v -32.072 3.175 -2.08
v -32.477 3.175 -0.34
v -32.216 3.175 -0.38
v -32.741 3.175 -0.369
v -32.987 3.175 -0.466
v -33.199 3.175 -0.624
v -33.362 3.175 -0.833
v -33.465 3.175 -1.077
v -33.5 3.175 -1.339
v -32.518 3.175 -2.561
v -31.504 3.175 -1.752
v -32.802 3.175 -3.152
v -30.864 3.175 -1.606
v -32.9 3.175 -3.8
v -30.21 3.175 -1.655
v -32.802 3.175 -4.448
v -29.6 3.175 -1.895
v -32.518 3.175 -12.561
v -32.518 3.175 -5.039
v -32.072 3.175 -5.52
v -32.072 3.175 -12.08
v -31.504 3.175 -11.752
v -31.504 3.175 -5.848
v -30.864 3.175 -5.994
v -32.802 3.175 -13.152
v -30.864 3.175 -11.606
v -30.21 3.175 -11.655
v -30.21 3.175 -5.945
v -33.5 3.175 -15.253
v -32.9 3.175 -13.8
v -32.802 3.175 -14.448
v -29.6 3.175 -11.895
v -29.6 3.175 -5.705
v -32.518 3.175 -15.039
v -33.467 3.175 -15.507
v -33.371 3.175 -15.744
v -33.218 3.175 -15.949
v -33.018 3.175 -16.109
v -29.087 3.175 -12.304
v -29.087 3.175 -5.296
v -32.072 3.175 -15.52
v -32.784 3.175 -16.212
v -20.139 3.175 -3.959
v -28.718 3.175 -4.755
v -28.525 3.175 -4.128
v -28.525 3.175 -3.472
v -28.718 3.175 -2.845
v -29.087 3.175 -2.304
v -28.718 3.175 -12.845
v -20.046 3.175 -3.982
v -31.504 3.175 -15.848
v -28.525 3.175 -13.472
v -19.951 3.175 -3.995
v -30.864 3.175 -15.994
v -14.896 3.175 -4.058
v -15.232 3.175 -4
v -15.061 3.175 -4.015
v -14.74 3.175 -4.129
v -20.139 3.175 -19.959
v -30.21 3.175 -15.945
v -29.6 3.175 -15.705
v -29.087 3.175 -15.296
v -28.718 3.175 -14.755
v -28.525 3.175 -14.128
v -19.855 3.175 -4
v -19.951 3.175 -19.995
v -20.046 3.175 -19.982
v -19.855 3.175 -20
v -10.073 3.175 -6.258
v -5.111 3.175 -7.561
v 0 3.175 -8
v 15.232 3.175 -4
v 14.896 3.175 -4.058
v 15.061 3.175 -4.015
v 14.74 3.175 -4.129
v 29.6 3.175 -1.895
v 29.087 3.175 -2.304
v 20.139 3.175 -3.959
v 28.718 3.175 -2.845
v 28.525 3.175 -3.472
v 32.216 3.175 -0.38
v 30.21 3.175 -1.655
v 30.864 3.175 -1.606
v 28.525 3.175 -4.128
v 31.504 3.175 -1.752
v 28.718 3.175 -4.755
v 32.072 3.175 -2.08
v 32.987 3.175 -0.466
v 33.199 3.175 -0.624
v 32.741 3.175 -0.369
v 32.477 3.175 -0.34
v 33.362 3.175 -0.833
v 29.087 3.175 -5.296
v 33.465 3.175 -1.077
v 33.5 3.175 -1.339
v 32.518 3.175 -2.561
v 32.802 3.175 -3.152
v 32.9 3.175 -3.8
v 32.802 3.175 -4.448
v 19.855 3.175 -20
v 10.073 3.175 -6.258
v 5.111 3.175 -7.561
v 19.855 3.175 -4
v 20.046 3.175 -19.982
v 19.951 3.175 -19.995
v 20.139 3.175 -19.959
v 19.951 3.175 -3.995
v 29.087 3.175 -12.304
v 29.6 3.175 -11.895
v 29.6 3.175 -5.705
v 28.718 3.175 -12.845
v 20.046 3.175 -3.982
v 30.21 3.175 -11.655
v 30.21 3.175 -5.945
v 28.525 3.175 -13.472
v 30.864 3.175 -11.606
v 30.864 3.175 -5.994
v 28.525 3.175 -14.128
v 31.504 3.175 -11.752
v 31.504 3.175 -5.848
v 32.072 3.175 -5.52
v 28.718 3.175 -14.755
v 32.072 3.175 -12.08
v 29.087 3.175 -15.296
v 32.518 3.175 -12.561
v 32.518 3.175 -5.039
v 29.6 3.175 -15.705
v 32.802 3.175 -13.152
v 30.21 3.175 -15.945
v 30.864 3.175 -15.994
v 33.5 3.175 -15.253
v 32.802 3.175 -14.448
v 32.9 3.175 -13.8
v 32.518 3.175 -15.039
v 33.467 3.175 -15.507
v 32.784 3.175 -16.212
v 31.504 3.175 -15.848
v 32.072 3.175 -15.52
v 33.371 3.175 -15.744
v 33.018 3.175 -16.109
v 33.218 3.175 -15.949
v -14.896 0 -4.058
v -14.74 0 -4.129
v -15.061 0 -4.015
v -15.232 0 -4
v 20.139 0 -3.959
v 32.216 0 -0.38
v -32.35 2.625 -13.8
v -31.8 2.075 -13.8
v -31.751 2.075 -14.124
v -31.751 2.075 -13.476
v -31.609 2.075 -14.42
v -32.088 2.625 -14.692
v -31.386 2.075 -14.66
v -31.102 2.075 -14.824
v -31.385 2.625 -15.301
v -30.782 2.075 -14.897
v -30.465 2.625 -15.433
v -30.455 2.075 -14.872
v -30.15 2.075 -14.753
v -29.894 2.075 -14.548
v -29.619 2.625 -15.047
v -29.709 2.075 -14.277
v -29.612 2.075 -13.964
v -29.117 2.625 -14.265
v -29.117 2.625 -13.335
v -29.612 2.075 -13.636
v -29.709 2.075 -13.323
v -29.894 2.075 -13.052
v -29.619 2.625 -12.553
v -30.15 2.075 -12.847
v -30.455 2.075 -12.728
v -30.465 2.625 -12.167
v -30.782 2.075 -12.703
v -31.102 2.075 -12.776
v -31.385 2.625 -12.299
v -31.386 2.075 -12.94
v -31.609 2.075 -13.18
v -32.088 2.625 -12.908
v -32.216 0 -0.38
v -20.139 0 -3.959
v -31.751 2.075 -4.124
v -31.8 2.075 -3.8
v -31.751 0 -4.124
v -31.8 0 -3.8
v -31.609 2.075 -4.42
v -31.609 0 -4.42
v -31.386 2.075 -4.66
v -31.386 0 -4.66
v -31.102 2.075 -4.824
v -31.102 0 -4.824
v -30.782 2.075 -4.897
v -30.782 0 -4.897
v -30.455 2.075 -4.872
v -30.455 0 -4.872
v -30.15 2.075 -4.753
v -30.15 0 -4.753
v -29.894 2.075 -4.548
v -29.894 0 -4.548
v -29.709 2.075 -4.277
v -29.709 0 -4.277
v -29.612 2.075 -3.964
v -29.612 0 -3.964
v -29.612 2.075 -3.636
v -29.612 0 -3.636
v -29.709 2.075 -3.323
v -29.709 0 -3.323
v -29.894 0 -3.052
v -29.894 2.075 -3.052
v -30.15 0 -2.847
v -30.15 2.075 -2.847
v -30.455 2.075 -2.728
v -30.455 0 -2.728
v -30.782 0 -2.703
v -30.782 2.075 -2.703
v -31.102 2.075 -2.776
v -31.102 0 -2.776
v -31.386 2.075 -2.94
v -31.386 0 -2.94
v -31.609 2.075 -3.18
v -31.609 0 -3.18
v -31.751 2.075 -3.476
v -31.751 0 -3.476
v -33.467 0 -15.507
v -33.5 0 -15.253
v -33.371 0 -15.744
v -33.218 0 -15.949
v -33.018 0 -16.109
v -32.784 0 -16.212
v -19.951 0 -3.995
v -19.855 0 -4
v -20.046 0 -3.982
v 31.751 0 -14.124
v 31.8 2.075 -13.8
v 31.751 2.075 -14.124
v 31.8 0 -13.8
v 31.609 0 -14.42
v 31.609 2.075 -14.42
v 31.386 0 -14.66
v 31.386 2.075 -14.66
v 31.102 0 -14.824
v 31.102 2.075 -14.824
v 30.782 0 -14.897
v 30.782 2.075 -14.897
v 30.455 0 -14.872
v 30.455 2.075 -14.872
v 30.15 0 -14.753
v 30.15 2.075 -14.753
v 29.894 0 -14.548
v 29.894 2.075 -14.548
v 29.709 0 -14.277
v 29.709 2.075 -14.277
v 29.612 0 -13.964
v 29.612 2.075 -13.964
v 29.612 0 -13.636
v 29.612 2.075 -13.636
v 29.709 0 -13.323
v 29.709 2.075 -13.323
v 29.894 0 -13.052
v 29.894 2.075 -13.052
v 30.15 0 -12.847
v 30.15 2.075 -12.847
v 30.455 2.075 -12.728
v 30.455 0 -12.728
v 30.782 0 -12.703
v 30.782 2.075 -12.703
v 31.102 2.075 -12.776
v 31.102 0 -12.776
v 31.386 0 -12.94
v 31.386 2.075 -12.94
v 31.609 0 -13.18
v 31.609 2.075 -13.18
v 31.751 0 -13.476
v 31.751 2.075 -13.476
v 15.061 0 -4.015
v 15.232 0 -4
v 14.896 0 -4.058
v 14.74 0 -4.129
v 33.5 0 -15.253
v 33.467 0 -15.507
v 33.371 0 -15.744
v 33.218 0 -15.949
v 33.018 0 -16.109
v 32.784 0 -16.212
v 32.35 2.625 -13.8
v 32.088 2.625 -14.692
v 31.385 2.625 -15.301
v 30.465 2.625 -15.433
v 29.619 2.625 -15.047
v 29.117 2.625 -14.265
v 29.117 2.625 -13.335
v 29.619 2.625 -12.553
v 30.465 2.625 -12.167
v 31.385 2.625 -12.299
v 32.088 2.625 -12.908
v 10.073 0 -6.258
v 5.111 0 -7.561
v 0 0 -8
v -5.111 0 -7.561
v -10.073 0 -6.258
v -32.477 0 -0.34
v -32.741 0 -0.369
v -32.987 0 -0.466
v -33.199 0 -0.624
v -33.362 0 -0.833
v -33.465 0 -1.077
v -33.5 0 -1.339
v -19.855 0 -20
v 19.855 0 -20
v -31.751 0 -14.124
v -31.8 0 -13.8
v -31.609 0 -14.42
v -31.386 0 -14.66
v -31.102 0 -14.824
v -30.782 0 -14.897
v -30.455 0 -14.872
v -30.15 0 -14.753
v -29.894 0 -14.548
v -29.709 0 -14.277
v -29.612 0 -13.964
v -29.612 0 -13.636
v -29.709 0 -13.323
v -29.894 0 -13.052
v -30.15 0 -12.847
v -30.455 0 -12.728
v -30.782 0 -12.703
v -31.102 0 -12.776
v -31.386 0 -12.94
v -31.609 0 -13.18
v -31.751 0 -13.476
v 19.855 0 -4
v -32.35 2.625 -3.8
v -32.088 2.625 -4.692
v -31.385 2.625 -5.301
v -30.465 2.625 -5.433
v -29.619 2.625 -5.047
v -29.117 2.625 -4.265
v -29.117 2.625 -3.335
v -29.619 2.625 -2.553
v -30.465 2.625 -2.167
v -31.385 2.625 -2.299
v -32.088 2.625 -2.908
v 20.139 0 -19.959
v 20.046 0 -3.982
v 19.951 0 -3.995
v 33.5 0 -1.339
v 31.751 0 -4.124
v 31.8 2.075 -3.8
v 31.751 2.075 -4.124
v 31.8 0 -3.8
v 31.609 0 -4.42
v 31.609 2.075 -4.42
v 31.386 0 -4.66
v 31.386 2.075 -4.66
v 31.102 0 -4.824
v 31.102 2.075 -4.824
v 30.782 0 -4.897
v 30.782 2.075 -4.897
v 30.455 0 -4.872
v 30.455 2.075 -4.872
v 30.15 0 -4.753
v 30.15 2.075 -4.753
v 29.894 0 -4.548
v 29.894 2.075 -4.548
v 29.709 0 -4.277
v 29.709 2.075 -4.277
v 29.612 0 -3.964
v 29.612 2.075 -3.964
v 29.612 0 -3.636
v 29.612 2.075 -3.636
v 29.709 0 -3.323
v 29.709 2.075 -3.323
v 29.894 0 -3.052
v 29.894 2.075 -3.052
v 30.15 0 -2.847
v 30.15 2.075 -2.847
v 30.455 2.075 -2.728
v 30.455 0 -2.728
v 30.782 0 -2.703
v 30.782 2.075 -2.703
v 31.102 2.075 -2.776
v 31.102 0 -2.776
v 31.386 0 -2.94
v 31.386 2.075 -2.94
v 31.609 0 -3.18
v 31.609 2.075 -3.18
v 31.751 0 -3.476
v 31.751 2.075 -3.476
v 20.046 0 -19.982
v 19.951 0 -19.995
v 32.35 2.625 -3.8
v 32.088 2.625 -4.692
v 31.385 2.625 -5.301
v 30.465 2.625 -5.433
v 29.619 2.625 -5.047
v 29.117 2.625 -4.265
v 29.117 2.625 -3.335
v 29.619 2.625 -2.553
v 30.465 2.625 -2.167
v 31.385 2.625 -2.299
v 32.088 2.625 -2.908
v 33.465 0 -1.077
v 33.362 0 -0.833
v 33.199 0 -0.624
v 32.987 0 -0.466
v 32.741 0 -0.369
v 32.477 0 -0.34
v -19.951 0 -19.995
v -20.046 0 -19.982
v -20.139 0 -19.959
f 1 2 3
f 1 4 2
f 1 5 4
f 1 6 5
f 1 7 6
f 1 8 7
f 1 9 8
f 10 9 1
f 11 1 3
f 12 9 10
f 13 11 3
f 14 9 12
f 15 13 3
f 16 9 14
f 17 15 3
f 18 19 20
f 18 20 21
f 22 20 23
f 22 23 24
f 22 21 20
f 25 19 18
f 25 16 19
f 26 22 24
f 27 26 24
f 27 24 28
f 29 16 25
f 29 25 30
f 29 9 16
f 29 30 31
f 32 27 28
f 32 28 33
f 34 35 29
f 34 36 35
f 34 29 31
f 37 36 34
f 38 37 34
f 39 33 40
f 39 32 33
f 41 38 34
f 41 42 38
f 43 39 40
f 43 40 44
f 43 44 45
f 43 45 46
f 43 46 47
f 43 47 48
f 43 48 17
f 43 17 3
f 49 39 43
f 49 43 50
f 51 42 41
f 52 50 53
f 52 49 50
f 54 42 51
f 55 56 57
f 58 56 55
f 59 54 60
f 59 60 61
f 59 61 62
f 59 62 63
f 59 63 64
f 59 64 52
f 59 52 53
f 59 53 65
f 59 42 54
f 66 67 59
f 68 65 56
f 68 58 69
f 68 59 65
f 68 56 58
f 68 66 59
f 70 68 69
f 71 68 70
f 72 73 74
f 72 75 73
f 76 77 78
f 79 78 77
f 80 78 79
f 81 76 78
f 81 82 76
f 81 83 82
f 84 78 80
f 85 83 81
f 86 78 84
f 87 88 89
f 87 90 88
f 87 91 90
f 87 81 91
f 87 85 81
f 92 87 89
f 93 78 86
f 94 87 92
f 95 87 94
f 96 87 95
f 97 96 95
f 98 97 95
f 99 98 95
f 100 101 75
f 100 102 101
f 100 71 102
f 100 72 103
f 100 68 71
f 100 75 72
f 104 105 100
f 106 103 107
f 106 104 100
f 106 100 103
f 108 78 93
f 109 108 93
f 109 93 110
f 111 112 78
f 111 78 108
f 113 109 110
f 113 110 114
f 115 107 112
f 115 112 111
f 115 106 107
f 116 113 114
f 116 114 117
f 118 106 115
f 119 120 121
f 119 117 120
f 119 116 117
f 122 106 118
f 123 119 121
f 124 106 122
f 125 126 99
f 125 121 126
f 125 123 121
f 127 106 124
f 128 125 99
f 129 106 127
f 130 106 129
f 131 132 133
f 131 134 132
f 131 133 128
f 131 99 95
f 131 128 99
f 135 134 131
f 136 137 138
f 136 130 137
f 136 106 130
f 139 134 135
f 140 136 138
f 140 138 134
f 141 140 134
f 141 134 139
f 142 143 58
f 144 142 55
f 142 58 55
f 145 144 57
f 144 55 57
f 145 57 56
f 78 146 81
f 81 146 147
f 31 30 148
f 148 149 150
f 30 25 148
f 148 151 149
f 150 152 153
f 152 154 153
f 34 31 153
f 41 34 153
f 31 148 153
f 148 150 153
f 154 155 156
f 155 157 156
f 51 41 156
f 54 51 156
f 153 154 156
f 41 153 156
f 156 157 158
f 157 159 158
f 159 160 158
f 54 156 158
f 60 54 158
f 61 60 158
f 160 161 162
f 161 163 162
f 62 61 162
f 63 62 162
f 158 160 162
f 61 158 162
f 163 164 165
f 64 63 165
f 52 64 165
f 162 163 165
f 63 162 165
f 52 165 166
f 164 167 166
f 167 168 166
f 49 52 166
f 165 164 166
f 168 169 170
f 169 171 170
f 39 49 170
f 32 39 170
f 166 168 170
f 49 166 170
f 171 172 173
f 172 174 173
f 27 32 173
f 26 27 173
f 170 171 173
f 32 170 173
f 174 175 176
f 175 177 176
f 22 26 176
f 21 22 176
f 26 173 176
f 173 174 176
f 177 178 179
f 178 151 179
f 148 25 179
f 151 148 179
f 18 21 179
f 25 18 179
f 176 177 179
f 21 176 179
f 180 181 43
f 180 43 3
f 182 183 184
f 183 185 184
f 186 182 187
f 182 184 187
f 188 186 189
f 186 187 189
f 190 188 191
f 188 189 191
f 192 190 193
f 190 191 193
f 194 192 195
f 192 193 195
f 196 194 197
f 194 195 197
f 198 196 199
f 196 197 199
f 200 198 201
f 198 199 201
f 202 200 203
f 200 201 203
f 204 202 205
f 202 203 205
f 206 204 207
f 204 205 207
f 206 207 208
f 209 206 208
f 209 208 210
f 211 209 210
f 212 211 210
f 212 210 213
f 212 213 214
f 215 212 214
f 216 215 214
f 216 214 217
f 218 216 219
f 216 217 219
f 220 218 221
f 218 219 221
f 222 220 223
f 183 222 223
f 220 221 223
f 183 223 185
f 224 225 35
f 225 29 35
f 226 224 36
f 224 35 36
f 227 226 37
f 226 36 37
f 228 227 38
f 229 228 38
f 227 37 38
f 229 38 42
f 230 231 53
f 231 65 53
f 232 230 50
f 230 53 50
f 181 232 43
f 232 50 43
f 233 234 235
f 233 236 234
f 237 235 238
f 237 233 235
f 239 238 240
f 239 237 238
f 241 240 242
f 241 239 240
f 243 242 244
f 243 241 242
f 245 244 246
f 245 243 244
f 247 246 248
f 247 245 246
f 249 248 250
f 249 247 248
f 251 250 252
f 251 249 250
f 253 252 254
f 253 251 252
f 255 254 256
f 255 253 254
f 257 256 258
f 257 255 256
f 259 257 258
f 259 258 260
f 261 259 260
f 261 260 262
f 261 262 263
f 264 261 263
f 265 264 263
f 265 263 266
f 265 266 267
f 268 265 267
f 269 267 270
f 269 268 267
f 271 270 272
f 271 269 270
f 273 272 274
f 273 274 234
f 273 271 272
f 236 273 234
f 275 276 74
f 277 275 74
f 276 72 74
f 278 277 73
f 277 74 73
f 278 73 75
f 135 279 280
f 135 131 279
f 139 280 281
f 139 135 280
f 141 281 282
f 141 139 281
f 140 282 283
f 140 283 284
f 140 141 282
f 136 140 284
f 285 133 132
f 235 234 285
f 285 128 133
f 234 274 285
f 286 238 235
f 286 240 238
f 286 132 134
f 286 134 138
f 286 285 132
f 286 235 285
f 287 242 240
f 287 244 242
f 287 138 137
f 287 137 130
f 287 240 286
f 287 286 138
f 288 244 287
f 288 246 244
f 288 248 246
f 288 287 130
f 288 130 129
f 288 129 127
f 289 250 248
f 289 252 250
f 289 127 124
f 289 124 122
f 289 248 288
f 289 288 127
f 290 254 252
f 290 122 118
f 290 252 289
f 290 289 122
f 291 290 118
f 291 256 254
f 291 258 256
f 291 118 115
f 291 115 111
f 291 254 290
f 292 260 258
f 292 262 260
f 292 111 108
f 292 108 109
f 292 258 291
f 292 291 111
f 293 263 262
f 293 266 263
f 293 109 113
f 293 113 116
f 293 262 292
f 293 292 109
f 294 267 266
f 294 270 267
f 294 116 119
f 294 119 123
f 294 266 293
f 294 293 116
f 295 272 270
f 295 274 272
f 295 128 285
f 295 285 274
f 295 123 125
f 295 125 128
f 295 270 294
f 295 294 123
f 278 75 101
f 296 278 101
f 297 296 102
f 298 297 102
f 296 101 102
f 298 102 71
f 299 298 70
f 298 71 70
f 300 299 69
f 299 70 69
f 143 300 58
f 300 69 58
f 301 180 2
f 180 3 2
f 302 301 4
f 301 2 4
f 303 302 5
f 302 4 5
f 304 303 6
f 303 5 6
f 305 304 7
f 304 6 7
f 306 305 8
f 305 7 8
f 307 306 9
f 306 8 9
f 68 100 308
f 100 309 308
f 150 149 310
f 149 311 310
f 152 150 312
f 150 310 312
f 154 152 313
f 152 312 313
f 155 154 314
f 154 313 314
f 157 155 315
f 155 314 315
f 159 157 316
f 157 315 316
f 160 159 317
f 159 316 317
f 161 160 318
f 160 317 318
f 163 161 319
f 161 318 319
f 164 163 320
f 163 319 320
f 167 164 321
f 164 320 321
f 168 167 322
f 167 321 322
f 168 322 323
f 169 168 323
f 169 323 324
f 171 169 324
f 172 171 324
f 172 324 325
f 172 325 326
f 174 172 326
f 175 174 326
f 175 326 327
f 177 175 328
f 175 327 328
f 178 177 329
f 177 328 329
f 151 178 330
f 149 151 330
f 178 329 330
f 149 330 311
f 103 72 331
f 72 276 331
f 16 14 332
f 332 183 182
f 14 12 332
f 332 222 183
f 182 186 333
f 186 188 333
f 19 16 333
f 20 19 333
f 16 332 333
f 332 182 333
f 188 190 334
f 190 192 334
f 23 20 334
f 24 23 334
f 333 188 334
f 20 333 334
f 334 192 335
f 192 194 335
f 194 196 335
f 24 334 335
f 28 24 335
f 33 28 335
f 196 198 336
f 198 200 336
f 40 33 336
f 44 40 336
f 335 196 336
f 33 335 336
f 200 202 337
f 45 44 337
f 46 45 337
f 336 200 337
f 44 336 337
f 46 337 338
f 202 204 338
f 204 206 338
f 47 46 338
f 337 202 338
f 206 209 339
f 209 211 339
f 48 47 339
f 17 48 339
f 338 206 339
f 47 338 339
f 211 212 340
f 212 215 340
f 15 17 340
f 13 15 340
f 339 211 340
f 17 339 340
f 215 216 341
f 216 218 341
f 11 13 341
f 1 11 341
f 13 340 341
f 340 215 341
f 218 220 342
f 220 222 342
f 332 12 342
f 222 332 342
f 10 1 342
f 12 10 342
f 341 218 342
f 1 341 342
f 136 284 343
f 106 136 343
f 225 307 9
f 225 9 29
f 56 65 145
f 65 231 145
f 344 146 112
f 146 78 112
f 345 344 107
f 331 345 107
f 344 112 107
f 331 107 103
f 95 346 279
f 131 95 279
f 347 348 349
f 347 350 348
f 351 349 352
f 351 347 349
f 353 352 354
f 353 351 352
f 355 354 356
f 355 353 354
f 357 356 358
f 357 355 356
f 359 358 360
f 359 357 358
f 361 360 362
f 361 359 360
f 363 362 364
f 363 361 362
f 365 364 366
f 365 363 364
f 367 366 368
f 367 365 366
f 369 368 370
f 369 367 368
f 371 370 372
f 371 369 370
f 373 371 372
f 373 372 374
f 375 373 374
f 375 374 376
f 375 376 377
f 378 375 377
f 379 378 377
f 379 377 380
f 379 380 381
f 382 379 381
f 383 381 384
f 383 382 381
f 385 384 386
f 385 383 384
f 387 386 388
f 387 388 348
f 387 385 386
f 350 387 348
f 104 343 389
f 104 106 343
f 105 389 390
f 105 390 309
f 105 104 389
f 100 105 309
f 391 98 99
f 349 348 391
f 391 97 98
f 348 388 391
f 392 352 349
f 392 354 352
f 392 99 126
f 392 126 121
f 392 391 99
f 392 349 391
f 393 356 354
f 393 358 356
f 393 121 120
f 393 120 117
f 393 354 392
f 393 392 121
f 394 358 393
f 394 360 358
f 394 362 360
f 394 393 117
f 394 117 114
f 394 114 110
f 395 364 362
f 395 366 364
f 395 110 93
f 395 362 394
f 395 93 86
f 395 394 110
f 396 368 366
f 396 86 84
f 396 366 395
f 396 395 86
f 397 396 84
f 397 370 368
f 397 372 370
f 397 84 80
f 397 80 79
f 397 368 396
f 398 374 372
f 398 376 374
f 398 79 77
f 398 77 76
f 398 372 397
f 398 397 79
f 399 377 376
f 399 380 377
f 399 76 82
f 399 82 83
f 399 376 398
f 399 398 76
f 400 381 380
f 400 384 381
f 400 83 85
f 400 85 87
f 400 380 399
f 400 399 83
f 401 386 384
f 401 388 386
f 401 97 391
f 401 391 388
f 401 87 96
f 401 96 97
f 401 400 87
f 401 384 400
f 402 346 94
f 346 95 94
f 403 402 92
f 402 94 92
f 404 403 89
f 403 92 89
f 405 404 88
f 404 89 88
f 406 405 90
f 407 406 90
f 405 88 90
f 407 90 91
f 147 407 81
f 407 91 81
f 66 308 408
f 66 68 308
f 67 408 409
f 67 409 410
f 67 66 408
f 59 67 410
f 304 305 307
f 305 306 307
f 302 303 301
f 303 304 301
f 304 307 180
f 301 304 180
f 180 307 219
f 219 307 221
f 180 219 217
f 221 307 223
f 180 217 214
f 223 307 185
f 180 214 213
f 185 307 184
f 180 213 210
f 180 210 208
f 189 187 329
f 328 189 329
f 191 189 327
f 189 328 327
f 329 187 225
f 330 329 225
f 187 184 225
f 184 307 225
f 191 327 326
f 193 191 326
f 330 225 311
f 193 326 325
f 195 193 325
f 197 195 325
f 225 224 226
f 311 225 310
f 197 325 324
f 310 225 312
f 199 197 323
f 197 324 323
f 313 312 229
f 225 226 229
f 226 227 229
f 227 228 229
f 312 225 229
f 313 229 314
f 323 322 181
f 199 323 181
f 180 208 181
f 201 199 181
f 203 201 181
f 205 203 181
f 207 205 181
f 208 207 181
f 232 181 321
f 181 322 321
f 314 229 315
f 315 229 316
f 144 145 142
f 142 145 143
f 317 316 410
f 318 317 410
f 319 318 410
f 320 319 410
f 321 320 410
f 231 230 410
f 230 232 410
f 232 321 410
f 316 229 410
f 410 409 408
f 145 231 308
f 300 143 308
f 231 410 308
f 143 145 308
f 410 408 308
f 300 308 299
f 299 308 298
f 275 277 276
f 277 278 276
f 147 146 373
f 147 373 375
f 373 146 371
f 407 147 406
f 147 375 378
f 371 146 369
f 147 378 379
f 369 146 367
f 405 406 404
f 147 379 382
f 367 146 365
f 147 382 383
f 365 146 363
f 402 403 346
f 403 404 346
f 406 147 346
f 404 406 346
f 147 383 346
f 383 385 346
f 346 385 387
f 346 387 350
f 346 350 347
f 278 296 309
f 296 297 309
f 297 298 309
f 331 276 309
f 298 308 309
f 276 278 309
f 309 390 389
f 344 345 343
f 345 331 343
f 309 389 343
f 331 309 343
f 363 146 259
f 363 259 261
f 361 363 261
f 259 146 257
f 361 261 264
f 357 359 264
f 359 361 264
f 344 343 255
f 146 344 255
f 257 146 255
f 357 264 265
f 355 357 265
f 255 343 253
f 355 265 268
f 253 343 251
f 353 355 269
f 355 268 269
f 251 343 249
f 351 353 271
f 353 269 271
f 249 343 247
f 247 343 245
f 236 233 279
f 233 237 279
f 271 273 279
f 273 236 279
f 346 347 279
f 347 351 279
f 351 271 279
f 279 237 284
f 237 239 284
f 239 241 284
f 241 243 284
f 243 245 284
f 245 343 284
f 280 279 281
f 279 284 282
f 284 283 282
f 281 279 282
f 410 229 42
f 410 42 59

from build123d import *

# Parameters (mm, degrees)
BOSS_EXTRUDE1_DEPTH                             = 3.175
CSK_FOR_M2_FLAT_HEAD_MACHINE_SCREW1_D           = 2.2
CSK_FOR_M2_FLAT_HEAD_MACHINE_SCREW1_CSINK_D     = 4.4
CSK_FOR_M2_FLAT_HEAD_MACHINE_SCREW1_CSINK_ANGLE = 90
SKETCH5_R                                       = 30
CUT_EXTRUDE2_DEPTH                              = 40.144994891
FILLET1_R                                       = 1


with BuildPart() as part:
    # Sketch1 → Boss-Extrude1 (new body)
    with BuildSketch(Plane(origin=(0, 0, 0), x_dir=(1, 0, 0), z_dir=(0, 1, 0))):
        Polygon((-33.5, 0), (-33.5, 16), (-20, 20), (0, 20), (0, 4), (-20, 4), align=None)
    extrude(amount=BOSS_EXTRUDE1_DEPTH)

    # CSK for M2 Flat Head Machine Screw1 (through all)
    with Locations(Plane(origin=(0, 3.175, 0), x_dir=(1, 0, 0), z_dir=(0, 1, 0))):
        with Locations((-30.7, 13.8), (-30.7, 3.8)):
            CounterSinkHole(CSK_FOR_M2_FLAT_HEAD_MACHINE_SCREW1_D / 2, CSK_FOR_M2_FLAT_HEAD_MACHINE_SCREW1_CSINK_D / 2, counter_sink_angle=CSK_FOR_M2_FLAT_HEAD_MACHINE_SCREW1_CSINK_ANGLE)

    # Mirror1: part across plane


with BuildPart() as part_1:
    add(part.part)
    add(part.part.mirror(Plane(origin=(0, 0, 0), x_dir=(0, 0, 1), z_dir=(1, 0, 0))))

    # Sketch5 → Cut-Extrude2 (cut, through all)
    with BuildSketch(Plane(origin=(0, 3.175, 0), x_dir=(1, 0, 0), z_dir=(0, 1, 0))):
        with Locations((0, -22)):
            Circle(SKETCH5_R)
    extrude(amount=-CUT_EXTRUDE2_DEPTH, mode=Mode.SUBTRACT)

    # Fillet1
    fillet1_edges = [part_1.edges().sort_by_distance(p)[0] for p in [
        (-20, 1.5875, -4),
        (-33.5, 1.5875, 0),
        (-33.5, 1.5875, -16),
        (-20, 1.5875, -20),
        (20, 1.5875, -20),
        (33.5, 1.5875, -16),
        (33.5, 1.5875, 0),
        (20, 1.5875, -4),
        (-14.966629547, 1.5875, -4),
        (14.966629547, 1.5875, -4),
    ]]
    fillet(fillet1_edges, radius=FILLET1_R)


solid = part_1.part
